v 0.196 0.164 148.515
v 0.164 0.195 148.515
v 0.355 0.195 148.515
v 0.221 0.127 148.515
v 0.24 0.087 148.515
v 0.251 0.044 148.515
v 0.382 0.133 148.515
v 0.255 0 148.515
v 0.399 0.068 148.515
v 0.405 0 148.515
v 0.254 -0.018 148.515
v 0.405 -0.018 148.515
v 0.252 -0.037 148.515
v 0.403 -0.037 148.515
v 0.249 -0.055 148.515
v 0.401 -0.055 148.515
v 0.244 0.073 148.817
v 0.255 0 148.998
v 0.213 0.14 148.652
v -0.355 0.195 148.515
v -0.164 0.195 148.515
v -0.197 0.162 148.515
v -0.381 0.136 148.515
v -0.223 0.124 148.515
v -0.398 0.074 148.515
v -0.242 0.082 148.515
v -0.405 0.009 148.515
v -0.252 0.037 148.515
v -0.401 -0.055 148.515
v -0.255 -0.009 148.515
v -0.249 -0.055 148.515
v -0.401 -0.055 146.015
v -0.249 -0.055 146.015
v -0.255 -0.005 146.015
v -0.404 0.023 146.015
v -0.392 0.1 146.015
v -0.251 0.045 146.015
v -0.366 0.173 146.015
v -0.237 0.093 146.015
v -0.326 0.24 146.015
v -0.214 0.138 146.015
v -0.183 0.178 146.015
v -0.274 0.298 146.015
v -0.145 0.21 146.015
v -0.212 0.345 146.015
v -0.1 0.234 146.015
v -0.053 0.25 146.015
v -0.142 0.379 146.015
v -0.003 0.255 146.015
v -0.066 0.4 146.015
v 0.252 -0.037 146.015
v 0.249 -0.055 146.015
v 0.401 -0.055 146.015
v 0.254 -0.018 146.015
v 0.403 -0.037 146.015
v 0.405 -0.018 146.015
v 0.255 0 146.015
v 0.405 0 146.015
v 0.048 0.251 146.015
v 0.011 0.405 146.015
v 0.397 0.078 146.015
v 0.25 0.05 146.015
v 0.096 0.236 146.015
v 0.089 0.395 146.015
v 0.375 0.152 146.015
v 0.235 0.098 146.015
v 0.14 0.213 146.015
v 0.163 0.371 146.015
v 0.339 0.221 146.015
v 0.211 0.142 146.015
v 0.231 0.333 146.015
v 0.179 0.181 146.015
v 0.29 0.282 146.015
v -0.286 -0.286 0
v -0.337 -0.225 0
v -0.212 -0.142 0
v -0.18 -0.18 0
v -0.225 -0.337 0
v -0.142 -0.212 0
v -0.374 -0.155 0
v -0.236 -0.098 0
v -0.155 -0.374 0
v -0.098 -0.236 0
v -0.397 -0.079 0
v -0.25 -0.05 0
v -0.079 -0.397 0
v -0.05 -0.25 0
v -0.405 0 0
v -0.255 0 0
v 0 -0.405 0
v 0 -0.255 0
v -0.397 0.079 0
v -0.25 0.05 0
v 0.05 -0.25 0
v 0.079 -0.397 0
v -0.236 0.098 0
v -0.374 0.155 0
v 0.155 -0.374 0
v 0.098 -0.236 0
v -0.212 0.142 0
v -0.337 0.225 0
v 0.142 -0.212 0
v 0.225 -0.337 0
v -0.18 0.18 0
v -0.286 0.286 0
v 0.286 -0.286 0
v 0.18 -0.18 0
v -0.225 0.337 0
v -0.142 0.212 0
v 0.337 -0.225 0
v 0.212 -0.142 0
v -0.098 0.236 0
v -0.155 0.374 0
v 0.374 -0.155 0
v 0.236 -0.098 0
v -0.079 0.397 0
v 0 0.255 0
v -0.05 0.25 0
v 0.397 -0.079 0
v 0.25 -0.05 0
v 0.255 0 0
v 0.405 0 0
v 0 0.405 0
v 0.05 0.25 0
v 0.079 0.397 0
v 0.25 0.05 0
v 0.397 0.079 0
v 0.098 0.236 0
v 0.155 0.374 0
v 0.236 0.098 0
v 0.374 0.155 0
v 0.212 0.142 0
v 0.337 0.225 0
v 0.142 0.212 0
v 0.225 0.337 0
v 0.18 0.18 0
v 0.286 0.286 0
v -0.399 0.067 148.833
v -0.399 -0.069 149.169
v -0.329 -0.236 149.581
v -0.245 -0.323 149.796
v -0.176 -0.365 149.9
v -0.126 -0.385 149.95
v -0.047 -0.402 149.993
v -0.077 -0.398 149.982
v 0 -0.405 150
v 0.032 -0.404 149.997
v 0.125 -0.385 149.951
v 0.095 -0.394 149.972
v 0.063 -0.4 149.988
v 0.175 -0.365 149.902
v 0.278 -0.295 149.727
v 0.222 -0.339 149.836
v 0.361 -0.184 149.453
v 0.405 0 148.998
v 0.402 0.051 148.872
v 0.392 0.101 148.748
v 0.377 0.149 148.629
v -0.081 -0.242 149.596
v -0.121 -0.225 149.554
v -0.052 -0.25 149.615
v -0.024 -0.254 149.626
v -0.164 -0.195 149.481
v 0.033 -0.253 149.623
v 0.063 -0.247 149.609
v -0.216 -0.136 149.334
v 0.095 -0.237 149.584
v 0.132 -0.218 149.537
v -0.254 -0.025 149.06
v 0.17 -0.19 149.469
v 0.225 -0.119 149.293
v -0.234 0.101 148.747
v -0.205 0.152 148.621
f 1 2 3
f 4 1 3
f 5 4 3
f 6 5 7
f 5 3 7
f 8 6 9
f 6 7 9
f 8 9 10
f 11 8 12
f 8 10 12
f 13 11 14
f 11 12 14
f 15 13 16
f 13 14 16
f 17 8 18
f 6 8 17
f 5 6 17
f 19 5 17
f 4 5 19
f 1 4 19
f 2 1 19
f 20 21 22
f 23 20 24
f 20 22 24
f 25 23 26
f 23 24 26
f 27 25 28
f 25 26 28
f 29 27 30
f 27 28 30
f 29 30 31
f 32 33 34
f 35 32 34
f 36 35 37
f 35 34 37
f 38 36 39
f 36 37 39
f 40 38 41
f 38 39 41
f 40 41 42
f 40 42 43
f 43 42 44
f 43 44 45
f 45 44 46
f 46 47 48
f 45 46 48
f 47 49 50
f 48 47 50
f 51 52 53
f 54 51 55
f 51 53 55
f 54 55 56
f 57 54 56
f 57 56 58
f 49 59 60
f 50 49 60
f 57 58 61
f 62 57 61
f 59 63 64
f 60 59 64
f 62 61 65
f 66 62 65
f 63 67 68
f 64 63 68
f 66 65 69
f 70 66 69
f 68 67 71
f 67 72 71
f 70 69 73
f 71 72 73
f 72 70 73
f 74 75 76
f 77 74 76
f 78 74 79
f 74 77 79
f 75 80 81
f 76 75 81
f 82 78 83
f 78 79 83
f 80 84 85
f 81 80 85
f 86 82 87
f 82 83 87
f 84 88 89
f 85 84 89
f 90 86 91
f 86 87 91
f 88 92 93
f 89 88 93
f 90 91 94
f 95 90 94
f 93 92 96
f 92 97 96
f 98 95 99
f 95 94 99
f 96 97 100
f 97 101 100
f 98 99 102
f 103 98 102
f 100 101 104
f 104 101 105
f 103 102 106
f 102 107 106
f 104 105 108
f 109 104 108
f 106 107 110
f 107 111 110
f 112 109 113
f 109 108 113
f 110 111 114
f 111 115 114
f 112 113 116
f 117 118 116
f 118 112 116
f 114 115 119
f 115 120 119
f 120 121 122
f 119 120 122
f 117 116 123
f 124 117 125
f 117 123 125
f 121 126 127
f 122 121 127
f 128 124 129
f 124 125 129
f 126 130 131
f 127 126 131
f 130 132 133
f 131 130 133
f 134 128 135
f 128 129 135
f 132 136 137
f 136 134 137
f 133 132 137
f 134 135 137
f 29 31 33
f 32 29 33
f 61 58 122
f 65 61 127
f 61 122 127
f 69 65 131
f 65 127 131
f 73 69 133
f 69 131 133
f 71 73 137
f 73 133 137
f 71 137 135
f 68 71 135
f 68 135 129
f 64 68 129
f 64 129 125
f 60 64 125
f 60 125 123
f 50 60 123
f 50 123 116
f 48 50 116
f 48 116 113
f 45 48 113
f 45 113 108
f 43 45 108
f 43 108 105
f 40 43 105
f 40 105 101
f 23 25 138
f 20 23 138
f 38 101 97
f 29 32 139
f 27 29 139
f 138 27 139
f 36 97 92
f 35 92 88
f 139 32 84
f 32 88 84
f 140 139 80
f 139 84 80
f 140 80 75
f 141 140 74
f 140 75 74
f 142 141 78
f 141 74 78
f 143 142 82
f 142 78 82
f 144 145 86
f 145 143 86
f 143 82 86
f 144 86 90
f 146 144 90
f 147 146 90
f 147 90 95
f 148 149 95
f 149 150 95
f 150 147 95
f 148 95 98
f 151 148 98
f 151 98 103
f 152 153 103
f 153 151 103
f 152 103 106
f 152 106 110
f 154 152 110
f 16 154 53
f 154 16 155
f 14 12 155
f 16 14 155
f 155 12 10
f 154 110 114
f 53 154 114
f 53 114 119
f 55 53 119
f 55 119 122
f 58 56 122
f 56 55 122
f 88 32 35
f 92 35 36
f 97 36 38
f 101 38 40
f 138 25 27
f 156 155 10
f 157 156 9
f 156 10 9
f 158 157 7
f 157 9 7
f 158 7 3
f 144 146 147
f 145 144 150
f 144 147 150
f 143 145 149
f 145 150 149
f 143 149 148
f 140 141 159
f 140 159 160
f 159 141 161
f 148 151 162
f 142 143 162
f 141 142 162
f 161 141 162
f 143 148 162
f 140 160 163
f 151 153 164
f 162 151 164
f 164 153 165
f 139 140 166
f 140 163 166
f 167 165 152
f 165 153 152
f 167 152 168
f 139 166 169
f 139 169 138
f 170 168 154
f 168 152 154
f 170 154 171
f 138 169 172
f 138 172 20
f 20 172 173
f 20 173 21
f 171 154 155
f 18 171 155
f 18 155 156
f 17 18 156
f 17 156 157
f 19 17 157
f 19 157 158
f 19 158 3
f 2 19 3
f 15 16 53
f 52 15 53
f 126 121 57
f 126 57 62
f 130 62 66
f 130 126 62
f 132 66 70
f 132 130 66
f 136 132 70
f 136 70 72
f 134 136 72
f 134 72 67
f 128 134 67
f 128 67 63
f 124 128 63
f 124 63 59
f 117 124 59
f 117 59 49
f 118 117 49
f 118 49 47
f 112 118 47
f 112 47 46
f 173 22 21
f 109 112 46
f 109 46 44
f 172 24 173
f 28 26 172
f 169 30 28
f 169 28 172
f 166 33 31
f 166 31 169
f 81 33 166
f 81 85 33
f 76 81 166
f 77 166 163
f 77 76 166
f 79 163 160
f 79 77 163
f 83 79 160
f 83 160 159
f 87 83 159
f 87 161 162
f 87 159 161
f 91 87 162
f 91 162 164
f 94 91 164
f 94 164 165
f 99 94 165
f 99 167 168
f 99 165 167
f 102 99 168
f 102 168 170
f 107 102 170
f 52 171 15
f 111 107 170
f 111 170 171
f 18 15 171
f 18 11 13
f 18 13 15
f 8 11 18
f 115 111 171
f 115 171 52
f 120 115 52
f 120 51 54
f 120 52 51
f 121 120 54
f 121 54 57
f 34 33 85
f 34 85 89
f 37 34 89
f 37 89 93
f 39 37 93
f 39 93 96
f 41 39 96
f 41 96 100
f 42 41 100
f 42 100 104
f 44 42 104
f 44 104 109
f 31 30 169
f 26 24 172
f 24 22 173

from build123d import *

# Parameters (mm, degrees)
SKETCH1_R           = 0.405
SKETCH1_R_2         = 0.255
BOSS_EXTRUDE1_DEPTH = 150
CUT_EXTRUDE1_DEPTH  = 0.5


with BuildPart() as part:
    # Sketch1 → Boss-Extrude1 (new body)
    with BuildSketch(Plane.XY):
        Circle(SKETCH1_R)
        Circle(SKETCH1_R_2, mode=Mode.SUBTRACT)
    extrude(amount=BOSS_EXTRUDE1_DEPTH)

    # Sketch2 → Cut-Extrude1 (cut, symmetric)
    with BuildSketch(Plane(origin=(0, 0, 0), x_dir=(0, 0, -1), z_dir=(1, 0, 0))):
        Polygon((-150, -0.405), (-148.514947888, 0.195), (-148.514947888, -0.055), (-146.014947888, -0.055), (-146.014947888, 0.595), (-150.3, 0.595), (-150.3, -0.405), align=None)
    extrude(amount=CUT_EXTRUDE1_DEPTH, both=True, mode=Mode.SUBTRACT)


solid = part.part
